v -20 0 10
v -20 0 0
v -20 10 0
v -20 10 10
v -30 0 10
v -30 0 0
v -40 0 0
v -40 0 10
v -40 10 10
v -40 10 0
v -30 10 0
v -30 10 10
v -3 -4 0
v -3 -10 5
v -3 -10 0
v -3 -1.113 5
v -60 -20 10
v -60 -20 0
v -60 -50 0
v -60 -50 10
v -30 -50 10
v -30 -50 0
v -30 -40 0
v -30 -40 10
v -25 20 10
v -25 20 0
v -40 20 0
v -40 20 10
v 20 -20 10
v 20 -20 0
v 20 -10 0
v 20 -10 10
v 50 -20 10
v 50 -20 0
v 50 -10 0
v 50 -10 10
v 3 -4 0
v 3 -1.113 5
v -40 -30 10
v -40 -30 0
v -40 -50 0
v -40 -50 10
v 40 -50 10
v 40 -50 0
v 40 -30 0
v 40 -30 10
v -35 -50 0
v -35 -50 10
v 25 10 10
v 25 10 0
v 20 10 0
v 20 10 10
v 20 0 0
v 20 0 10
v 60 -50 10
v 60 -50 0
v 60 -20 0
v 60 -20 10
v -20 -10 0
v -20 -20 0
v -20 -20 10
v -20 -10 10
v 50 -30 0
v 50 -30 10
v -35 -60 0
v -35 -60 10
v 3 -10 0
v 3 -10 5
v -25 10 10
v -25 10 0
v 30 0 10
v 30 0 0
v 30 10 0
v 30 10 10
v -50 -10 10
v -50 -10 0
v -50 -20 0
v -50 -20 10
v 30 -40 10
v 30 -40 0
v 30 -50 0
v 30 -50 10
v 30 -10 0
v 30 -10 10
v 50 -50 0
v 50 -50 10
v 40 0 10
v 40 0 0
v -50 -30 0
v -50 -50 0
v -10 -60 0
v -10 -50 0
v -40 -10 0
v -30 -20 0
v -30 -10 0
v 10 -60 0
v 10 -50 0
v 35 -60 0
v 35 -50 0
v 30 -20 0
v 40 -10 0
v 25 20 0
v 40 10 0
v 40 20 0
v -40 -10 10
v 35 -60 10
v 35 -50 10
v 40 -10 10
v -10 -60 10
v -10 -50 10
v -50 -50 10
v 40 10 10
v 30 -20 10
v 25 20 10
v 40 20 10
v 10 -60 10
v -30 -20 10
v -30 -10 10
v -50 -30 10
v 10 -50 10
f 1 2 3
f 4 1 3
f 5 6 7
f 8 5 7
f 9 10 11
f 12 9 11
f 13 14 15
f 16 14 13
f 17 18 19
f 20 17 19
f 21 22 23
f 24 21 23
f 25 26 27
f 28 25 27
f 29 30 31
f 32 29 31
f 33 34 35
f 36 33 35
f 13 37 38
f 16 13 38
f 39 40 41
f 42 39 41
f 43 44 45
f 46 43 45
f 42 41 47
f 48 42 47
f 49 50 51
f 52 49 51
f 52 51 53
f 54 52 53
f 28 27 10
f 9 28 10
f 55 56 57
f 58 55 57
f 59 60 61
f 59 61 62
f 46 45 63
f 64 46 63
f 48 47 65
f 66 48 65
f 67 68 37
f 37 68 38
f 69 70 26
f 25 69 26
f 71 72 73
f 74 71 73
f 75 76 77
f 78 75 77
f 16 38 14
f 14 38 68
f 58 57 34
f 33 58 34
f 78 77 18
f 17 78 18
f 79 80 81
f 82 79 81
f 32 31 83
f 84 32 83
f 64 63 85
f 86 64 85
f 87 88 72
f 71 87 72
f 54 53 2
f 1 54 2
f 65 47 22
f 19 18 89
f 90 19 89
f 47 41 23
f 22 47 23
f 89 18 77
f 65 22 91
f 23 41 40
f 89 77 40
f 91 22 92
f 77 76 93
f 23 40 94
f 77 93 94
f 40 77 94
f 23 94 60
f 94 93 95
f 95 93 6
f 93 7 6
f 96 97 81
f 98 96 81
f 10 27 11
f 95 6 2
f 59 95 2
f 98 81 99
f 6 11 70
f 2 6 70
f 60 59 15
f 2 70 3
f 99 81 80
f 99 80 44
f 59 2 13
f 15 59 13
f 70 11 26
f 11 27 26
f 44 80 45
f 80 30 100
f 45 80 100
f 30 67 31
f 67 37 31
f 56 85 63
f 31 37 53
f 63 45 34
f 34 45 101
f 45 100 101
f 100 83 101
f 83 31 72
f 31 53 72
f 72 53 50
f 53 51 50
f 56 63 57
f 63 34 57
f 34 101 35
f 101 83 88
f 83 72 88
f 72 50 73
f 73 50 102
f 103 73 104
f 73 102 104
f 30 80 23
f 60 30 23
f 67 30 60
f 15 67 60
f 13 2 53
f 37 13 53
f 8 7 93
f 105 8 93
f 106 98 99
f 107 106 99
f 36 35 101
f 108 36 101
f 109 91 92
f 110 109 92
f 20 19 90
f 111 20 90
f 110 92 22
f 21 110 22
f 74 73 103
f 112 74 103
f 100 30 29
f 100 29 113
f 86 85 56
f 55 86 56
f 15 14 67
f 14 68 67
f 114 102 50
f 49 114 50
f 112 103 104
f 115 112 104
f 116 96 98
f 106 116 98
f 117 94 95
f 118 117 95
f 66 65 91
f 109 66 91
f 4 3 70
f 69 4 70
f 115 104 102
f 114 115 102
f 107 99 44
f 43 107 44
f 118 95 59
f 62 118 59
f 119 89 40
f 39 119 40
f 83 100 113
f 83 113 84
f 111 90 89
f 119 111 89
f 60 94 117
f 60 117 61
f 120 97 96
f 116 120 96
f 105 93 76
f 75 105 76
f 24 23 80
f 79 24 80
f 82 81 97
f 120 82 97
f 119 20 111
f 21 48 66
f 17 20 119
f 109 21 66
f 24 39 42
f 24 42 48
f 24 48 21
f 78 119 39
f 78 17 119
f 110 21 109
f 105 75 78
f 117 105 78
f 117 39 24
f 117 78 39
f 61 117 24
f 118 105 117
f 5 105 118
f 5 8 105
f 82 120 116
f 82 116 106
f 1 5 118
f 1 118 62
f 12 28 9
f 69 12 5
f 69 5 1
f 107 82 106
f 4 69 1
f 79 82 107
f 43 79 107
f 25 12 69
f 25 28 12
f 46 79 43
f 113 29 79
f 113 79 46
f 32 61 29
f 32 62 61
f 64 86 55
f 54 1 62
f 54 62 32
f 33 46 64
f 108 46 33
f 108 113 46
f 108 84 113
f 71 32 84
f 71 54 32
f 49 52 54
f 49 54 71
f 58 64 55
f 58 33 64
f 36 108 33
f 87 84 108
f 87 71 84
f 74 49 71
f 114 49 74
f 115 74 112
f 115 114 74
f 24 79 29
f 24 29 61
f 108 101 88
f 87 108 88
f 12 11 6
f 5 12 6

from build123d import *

# Parameters (mm, degrees)
F0_W     = 10
F0_H     = 10
F0_R     = 6
F1_DEPTH = 10
F3_DEPTH = 3


with BuildPart() as f1:
    # F0 (on Top) → F1 (new body)
    with BuildSketch(Plane.XY):
        Polygon((10, 0), (0, 0), (-10, 0), (-20, 0), (-20, 10), (-25, 10), (-30, 10), (-30, 0), (-40, 0), (-40, -10), (-50, -10), (-50, -20), (-60, -20), (-60, -30), (-60, -50), (-50, -50), (-50, -30), (-40, -30), (-40, -40), (-40, -50), (-35, -50), (-30, -50), (-30, -40), (-20, -40), (-10, -40), (0, -40), (10, -40), (20, -40), (30, -40), (30, -50), (35, -50), (40, -50), (40, -40), (40, -30), (50, -30), (50, -50), (60, -50), (60, -30), (60, -20), (50, -20), (50, -10), (40, -10), (40, 0), (30, 0), (30, 10), (25, 10), (20, 10), (20, 0), align=None)
        with Locations((-25, -15)):
            Rectangle(F0_W, F0_H, mode=Mode.SUBTRACT)
        with Locations((0, -12)):
            Circle(F0_R, mode=Mode.SUBTRACT)
        with Locations((25, -15)):
            Rectangle(F0_W, F0_H, mode=Mode.SUBTRACT)
        Polygon((-30, 10), (-25, 10), (-25, 20), (-30, 20), (-40, 20), (-40, 10), align=None)
        Polygon((25, 20), (25, 10), (30, 10), (40, 10), (40, 20), (30, 20), align=None)
        Polygon((-30, -50), (-35, -50), (-35, -60), (-10, -60), (-10, -50), align=None)
        Polygon((35, -60), (35, -50), (30, -50), (10, -50), (10, -60), align=None)
        with Locations((0, -12)):
            Circle(F0_R)
    extrude(amount=F1_DEPTH)

    # F2 (on Right) → F3 (cut, symmetric)
    with BuildSketch(Plane.YZ):
        Polygon((-10, 5), (-10, 0), (-4, 0), (-1.1132486541, 5), align=None)
    extrude(amount=F3_DEPTH, both=True, mode=Mode.SUBTRACT)


solid = f1.part
